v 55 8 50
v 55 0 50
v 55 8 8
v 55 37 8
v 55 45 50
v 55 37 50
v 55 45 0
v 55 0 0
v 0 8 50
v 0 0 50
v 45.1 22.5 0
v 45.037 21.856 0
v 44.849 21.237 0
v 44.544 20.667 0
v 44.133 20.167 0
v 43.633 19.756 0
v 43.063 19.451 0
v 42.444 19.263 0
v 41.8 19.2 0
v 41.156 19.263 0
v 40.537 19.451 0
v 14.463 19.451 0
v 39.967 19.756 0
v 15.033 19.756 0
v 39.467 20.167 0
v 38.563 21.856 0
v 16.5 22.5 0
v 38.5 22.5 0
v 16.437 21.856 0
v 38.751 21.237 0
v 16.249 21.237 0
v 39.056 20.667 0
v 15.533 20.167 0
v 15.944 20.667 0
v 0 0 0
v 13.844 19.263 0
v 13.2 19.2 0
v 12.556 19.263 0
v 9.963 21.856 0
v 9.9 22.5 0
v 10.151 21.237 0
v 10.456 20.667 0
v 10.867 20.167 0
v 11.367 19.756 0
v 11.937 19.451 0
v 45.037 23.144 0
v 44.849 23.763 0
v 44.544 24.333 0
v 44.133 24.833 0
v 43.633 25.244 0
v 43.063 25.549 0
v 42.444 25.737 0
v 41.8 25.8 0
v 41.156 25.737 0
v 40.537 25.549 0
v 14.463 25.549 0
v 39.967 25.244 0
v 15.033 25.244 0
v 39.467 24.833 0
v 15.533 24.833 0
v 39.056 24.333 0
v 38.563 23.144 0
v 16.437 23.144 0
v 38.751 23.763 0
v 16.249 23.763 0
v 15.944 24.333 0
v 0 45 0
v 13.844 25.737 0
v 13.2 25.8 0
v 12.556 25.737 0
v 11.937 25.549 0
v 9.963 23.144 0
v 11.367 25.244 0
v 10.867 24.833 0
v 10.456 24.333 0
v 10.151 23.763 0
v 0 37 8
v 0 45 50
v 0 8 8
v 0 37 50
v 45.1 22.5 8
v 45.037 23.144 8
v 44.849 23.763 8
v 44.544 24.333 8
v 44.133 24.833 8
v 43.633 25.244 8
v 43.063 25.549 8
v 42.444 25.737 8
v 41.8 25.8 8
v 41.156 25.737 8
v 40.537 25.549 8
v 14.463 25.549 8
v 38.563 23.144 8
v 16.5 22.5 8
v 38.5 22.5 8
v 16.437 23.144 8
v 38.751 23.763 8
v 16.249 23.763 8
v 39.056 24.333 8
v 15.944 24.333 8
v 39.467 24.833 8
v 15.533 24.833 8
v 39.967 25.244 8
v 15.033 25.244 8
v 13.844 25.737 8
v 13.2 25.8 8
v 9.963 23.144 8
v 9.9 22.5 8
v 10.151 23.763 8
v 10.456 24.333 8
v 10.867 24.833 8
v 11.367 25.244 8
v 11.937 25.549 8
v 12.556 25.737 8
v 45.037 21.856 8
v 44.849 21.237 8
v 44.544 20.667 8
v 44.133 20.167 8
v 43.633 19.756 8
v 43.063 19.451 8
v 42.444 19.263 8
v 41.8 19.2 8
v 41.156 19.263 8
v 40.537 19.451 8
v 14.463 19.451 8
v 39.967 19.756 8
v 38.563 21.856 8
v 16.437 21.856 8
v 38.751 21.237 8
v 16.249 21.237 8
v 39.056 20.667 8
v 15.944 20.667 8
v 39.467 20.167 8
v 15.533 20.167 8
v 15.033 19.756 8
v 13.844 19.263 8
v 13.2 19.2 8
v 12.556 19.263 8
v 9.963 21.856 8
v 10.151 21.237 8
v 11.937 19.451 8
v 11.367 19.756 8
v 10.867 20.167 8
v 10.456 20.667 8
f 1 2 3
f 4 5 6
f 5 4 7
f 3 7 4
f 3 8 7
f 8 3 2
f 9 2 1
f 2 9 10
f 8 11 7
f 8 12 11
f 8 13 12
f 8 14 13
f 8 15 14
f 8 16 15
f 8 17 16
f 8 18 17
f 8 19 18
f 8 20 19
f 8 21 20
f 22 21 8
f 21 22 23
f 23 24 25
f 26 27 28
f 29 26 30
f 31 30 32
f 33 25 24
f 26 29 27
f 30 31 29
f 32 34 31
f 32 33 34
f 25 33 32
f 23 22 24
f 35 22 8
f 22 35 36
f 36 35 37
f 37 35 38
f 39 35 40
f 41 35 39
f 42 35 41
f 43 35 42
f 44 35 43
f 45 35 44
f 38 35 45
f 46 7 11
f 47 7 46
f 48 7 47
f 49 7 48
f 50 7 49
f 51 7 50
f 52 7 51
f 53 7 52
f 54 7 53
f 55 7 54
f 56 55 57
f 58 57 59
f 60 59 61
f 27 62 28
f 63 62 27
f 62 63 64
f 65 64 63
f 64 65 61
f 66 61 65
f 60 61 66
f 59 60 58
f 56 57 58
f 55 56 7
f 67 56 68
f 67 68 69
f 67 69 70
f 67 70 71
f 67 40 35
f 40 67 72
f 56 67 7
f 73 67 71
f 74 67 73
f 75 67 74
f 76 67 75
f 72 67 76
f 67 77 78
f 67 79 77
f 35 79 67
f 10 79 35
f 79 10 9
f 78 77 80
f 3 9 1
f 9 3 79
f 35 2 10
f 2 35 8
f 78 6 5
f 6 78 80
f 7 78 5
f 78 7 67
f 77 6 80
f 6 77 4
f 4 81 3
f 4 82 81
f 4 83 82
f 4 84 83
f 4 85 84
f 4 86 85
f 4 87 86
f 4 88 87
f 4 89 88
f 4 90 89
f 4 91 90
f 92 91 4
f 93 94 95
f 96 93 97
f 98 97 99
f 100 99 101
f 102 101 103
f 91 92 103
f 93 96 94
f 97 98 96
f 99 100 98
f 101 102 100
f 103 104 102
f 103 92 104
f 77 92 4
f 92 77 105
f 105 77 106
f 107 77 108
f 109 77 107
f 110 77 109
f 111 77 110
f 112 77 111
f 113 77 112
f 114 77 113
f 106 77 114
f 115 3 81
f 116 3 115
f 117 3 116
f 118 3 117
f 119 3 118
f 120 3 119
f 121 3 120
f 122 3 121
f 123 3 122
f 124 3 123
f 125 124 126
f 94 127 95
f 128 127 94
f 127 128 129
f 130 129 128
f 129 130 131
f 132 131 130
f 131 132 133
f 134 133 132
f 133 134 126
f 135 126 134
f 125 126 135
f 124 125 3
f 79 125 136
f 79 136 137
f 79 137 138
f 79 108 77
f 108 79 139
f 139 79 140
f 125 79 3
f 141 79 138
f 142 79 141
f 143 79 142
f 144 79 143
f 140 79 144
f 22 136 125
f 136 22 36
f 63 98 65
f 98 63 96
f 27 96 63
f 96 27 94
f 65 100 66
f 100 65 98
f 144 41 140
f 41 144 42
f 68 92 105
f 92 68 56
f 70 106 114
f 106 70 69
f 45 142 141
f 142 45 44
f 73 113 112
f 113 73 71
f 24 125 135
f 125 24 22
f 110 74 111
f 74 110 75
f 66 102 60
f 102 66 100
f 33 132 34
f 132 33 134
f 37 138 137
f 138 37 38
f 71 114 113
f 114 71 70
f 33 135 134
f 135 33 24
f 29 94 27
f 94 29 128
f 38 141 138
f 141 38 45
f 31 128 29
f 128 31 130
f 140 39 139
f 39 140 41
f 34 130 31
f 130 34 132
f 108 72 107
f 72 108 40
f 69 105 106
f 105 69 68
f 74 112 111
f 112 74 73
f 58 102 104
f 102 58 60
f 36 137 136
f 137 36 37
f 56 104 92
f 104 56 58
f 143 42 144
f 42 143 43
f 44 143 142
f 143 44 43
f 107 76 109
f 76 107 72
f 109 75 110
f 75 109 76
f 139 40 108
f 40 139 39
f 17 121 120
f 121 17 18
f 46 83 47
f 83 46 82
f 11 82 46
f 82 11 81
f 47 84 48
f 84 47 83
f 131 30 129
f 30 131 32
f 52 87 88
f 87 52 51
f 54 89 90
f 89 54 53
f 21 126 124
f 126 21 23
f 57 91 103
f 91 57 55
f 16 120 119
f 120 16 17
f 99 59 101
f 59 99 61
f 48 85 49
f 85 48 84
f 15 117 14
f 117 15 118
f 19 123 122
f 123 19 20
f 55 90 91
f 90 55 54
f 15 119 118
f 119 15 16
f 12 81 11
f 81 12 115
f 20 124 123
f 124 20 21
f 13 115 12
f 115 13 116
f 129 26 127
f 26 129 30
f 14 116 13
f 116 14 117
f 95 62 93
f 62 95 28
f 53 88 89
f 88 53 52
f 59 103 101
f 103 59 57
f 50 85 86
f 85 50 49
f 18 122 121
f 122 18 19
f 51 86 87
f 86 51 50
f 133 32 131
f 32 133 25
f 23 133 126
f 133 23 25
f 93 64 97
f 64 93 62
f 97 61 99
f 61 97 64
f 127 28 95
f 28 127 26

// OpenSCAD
$fn = 32;

// ----------------------------------------------------------------------
// U-bracket: 55 x 45 x 50 mm
// ----------------------------------------------------------------------

// --- parameters (mm) ---
rail_len = 55;            // outer length, X
jaw_w = 45;               // outer width, Y
jaw_h = 50;               // upright height, Z
web_t = 8;                // wall thickness
hole_d = 6.6;             // clearance for M6

module hole_z(px, py) {
  translate([px, py, -0.5]) cylinder(h = web_t + 1, d = hole_d);
}
module hole_y_pz(pz) {
  /* through both uprights along Y */
  translate([0, -0.5, pz]) rotate([-90, 0, 0]) cylinder(h = jaw_w + 1, d = hole_d);
}

module base() {
  cube([rail_len, jaw_w, web_t]);
}

module uprights() {
  cube([rail_len, web_t, jaw_h]);
  translate([0, jaw_w - web_t, 0]) cube([rail_len, web_t, jaw_h]);
}

difference() {
  union() {
    base();
    uprights();
  }
  hole_z(13.2, 22.5);
  hole_z(41.8, 22.5);
}
